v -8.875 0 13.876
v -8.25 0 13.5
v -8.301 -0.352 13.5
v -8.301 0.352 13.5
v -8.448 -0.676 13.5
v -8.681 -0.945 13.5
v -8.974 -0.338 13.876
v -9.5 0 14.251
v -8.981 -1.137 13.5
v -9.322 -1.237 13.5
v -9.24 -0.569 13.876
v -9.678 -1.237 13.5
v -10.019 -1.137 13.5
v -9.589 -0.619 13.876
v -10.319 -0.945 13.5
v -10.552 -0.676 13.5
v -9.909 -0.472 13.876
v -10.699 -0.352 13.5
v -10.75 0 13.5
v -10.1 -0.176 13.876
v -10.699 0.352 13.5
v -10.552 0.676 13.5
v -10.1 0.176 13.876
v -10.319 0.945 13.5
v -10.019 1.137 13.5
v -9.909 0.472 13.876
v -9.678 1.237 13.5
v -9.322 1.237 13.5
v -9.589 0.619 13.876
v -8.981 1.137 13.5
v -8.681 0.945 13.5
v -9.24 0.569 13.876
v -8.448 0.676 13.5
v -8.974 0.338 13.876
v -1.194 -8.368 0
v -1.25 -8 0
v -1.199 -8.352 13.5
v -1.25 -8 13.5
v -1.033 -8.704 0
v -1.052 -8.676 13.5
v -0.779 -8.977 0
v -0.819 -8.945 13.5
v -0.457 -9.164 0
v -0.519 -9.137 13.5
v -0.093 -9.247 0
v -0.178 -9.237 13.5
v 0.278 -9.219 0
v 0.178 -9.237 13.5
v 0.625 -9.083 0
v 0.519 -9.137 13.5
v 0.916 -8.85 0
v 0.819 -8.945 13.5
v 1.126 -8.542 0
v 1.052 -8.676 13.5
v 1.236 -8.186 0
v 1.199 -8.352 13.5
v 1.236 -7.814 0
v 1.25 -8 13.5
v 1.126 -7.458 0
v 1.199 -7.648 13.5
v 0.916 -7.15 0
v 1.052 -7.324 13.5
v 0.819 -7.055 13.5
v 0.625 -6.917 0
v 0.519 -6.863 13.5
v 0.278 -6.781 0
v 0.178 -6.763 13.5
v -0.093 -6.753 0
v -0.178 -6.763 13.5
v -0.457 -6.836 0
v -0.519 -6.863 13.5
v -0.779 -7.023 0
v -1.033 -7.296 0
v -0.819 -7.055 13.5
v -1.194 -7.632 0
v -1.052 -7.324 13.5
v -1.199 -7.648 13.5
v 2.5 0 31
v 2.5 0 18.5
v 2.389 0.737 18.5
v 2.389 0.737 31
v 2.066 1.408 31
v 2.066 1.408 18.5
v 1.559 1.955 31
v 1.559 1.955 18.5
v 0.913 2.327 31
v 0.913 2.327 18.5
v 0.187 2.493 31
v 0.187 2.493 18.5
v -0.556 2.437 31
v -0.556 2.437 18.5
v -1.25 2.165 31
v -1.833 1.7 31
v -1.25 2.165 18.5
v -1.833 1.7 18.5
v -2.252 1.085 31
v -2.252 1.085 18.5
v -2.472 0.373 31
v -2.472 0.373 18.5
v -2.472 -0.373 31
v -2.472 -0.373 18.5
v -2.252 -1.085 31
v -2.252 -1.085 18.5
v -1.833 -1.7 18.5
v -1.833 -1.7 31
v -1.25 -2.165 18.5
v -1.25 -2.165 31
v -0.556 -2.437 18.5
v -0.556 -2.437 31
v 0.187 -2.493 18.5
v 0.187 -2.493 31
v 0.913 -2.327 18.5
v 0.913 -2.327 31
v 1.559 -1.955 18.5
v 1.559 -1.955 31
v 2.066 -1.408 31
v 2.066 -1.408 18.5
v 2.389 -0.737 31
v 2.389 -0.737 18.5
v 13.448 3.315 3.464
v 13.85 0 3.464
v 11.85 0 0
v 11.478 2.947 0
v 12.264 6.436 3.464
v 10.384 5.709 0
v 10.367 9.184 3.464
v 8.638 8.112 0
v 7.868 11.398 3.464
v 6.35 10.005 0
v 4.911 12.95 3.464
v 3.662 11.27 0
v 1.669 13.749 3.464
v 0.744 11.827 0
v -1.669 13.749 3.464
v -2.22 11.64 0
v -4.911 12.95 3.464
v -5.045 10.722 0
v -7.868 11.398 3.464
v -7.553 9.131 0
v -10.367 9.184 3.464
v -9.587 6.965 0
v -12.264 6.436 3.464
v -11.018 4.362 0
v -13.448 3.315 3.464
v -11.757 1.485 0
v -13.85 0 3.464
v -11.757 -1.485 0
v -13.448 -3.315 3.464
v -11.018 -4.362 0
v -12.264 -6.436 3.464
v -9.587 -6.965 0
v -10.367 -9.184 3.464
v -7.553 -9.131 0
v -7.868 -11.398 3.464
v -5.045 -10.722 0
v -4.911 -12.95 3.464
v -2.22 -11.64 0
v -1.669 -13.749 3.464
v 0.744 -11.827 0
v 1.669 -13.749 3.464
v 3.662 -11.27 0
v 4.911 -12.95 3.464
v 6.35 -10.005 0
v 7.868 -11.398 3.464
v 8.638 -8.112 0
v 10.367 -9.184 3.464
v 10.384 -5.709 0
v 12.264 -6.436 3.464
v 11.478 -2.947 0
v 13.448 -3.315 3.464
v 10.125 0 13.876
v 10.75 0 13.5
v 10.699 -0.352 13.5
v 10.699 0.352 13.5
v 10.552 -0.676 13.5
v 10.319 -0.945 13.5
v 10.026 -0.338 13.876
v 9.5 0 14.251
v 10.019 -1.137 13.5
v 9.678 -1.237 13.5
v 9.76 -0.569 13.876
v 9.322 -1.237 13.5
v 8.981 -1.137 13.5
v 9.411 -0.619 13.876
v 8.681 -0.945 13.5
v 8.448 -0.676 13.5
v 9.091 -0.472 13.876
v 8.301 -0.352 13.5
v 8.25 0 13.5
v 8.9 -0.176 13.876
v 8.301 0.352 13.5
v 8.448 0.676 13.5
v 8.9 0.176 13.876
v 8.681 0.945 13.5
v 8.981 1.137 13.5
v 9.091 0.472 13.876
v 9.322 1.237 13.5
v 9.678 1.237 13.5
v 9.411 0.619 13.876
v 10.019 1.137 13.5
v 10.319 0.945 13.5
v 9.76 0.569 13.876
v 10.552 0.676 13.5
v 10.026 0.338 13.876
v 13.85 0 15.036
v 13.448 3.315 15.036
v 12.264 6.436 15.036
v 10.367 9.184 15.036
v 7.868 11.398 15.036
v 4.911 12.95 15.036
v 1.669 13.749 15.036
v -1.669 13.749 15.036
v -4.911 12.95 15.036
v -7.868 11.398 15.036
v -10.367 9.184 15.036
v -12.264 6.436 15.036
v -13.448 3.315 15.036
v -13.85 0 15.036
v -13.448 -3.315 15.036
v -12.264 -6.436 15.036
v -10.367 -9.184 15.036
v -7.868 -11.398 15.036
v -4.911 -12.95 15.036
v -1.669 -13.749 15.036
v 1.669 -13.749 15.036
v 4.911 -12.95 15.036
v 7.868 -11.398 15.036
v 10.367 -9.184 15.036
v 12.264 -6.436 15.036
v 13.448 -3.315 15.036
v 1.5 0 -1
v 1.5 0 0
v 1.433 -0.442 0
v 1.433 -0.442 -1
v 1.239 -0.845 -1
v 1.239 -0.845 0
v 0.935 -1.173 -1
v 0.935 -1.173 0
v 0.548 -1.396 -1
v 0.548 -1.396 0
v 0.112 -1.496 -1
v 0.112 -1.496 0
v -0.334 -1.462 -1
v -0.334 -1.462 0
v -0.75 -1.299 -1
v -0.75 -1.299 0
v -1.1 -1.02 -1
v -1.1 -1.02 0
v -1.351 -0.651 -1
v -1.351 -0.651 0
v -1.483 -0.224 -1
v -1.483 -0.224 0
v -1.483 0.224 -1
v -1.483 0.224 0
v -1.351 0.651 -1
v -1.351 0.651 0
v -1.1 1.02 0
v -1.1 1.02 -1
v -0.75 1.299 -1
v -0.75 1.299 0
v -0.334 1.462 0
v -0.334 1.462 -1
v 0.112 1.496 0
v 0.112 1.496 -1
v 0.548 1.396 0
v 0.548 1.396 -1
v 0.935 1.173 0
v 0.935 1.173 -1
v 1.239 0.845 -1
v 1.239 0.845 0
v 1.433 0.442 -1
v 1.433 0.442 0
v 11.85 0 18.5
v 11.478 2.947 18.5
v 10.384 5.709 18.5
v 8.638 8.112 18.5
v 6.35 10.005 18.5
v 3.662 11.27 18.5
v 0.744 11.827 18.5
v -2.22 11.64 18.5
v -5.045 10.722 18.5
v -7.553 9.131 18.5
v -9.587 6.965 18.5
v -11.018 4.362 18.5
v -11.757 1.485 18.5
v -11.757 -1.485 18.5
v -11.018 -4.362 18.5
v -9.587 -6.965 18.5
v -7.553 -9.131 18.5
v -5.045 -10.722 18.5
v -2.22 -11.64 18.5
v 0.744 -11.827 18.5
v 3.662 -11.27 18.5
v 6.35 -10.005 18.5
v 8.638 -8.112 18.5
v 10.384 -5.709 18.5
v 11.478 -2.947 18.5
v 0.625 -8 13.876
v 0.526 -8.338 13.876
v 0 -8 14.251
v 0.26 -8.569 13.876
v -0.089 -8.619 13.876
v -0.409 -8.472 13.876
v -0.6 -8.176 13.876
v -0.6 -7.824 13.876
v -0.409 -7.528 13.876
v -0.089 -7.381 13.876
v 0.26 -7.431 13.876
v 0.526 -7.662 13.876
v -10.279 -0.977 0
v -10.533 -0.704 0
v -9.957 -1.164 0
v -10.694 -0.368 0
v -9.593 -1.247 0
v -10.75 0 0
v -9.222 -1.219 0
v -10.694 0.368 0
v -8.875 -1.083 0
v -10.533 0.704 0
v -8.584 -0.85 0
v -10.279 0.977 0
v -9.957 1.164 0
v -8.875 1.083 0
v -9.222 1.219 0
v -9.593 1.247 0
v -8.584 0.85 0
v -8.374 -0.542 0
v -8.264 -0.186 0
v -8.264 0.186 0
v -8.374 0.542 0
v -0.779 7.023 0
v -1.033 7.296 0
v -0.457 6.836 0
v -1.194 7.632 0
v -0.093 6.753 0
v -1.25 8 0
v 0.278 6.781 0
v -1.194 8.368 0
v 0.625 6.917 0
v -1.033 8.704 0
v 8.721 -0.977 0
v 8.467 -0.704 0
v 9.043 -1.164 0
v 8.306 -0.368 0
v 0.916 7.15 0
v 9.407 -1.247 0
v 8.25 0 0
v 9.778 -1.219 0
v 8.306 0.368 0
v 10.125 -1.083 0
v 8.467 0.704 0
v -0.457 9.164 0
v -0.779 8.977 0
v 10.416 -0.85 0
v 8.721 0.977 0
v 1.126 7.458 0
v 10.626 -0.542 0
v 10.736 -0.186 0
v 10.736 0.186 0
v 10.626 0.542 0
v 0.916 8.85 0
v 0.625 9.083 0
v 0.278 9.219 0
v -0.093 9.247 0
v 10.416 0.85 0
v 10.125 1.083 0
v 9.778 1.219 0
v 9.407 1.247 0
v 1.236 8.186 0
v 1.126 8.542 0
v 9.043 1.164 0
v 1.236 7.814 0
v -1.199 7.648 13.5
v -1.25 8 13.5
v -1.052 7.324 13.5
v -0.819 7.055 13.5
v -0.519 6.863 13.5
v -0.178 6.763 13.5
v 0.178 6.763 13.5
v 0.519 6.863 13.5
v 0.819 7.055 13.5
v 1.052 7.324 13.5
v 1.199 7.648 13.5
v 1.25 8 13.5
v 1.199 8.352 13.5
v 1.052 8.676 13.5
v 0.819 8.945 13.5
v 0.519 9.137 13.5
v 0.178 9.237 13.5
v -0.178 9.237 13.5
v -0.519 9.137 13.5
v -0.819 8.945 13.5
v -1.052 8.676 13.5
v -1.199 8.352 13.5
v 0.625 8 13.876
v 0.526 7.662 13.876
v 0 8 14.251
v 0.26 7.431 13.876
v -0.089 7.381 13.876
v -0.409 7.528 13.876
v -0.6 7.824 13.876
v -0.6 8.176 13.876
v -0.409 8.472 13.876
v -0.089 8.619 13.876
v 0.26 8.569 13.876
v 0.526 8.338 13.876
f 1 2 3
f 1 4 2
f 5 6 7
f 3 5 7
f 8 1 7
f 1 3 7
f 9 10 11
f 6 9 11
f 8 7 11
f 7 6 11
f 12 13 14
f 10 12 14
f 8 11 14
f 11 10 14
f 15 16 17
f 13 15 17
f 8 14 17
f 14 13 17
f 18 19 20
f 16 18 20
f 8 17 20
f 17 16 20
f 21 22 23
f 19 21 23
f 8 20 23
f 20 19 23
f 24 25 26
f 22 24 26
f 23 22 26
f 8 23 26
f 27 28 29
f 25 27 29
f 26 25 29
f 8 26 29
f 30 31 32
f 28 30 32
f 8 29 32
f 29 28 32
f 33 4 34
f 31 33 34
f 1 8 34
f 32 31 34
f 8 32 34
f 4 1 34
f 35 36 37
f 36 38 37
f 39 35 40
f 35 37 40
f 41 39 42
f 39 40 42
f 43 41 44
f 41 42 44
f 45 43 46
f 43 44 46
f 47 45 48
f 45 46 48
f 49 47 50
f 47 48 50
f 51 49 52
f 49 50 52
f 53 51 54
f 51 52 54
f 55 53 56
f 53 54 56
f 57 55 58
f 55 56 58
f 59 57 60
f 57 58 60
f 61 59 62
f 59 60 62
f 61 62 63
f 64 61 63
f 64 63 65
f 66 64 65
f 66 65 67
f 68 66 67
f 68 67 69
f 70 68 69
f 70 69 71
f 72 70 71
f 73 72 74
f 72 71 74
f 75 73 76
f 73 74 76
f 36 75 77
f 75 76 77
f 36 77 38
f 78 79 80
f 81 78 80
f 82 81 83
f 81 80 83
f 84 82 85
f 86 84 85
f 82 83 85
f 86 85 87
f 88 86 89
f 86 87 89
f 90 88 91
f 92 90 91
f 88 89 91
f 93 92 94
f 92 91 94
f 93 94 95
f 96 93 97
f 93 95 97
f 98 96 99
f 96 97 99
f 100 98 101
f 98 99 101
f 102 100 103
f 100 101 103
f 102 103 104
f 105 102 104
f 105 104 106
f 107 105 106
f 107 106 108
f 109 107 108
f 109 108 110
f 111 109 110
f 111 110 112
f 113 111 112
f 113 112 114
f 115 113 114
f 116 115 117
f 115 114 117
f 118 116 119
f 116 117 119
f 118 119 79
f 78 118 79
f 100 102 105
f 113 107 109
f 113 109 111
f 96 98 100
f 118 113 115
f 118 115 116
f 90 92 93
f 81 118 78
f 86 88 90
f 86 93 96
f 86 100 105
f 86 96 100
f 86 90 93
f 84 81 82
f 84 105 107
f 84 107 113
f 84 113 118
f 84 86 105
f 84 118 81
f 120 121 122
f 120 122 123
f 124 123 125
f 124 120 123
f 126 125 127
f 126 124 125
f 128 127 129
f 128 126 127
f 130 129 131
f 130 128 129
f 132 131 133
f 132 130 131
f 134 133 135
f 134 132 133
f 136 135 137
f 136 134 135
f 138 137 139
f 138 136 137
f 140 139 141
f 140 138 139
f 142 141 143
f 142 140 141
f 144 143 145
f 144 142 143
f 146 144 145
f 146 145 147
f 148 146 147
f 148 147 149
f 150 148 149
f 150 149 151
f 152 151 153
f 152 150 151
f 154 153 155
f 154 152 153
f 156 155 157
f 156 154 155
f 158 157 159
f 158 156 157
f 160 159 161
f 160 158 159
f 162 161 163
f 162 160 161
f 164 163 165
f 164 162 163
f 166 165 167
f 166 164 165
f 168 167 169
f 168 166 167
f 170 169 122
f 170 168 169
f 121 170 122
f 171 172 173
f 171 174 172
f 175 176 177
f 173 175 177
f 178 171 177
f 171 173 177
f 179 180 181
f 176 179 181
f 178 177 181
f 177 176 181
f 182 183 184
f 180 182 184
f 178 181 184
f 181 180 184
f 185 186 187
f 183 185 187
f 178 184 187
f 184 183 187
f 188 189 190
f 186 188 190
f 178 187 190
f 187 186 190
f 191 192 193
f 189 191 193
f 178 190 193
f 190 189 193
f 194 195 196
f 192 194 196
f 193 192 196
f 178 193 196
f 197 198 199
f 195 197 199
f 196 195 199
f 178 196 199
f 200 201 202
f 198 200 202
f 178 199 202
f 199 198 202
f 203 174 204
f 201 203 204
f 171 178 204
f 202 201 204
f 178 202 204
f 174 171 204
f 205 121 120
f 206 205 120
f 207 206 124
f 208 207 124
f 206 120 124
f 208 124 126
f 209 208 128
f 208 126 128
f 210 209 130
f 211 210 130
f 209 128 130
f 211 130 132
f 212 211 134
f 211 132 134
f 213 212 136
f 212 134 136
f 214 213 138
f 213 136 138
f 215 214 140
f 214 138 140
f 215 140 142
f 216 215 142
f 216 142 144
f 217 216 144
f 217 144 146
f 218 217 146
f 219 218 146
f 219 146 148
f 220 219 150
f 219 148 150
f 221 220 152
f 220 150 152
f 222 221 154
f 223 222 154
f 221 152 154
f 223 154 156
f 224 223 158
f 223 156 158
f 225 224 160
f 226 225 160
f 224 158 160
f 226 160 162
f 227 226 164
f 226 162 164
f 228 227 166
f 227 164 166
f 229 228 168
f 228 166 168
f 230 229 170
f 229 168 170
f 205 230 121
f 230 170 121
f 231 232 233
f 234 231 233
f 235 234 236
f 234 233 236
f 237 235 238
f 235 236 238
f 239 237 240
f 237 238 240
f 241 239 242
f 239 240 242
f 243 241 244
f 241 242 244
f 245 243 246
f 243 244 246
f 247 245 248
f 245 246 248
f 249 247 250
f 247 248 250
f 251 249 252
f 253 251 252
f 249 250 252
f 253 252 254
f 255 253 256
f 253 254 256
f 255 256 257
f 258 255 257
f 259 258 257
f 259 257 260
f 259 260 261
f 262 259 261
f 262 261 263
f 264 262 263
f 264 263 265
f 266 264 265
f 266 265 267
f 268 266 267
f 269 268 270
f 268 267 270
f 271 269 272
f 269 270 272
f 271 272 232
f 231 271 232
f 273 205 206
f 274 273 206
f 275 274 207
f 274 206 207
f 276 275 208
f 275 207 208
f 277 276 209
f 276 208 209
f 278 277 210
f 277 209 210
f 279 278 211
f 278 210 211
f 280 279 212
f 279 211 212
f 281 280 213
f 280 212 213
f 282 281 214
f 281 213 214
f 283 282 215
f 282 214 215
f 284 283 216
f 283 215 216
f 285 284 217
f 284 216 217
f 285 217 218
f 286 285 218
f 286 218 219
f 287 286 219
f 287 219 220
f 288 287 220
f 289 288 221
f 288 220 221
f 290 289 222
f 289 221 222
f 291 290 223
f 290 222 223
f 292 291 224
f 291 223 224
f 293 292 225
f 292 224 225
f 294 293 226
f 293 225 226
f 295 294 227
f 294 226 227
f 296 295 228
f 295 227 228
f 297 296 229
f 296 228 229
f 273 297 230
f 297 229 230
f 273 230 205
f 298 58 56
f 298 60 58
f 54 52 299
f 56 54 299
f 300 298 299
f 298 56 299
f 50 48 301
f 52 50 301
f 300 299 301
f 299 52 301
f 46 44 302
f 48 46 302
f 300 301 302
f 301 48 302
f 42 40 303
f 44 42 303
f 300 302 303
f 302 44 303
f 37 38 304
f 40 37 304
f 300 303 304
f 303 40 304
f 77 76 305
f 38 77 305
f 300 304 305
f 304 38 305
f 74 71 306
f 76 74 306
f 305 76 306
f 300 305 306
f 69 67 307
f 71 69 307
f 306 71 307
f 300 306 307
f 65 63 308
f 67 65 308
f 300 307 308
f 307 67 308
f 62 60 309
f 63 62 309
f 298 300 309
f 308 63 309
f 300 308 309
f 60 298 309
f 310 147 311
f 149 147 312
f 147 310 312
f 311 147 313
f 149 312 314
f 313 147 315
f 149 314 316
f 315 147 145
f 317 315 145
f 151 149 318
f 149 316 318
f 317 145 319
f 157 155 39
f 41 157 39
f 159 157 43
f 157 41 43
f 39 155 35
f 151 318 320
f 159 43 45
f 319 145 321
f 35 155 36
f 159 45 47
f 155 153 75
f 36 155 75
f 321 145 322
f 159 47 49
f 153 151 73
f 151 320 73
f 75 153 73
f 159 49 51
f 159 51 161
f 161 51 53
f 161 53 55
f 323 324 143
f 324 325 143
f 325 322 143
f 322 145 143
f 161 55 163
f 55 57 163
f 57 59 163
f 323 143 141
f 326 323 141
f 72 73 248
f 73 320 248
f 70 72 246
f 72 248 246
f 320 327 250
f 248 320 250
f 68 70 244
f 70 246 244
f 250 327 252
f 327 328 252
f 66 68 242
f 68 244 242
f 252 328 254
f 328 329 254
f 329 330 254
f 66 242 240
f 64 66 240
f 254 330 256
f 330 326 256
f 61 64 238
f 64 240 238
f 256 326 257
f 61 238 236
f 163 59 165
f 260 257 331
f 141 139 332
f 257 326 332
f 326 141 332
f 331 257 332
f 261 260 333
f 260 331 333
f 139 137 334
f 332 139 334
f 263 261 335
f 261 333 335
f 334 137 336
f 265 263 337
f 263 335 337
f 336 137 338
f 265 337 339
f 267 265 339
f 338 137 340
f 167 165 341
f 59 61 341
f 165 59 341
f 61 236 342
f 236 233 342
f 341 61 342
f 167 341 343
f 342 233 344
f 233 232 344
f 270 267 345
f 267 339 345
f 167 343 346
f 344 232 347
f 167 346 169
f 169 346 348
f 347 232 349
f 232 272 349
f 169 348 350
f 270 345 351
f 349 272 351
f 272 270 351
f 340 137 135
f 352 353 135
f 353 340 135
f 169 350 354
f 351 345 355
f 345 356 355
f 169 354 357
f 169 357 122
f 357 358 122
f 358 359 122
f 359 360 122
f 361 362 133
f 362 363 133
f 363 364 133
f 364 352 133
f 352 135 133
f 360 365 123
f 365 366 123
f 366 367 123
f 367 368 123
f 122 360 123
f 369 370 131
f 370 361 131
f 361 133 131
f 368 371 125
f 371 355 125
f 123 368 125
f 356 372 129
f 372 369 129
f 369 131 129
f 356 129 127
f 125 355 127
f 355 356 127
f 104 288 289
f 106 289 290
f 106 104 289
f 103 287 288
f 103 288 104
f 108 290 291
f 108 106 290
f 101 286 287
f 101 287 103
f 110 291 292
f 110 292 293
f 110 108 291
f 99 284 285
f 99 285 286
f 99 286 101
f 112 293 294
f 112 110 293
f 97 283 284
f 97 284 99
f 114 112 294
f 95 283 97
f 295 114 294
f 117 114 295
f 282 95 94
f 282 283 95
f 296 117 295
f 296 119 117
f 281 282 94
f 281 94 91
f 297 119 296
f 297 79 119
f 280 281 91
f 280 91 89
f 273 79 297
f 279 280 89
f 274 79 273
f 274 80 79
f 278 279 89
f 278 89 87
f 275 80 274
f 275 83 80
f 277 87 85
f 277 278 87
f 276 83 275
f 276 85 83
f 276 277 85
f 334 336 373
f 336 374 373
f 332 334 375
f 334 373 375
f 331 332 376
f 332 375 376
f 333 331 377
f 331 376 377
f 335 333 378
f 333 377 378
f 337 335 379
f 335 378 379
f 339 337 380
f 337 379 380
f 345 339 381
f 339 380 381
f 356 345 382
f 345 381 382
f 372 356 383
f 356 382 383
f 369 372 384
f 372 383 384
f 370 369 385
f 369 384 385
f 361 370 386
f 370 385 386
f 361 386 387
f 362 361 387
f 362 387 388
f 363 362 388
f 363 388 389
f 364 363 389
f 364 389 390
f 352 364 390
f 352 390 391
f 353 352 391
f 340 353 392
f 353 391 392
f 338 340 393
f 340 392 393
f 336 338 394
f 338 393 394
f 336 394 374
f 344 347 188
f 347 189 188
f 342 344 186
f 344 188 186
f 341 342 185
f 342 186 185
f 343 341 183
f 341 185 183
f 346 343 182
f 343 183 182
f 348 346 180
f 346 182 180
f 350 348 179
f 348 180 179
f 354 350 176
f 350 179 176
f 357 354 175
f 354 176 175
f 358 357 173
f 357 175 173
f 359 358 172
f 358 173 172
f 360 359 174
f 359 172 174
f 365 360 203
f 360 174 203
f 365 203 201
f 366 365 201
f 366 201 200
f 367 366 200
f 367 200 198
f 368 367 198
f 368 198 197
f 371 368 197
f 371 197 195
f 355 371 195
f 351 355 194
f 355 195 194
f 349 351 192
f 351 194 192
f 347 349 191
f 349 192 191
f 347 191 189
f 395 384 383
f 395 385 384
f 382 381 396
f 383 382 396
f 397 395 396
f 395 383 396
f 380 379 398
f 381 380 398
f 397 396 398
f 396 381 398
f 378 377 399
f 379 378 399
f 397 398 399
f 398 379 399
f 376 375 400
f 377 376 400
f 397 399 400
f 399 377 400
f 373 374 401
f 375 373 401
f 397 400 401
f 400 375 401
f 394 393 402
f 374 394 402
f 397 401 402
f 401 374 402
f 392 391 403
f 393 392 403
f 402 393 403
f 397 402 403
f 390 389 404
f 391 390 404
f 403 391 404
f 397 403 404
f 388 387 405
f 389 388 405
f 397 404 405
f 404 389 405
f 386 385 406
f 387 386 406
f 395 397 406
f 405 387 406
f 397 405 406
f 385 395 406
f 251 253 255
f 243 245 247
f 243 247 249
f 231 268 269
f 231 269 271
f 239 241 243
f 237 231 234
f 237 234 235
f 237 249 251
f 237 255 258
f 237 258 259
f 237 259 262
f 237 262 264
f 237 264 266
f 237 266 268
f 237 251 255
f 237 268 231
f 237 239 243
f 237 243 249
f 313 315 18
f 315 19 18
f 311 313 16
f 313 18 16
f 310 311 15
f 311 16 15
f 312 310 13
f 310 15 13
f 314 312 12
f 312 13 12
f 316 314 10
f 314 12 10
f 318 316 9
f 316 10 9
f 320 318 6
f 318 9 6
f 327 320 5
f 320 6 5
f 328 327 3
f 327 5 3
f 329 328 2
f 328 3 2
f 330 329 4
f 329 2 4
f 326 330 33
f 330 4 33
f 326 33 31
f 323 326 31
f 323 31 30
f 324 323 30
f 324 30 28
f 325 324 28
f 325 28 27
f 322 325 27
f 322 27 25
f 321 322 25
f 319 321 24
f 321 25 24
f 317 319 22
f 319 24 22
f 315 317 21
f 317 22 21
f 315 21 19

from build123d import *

# Parameters (mm, degrees)
F0_R       = 13.85
F1_DEPTH   = 18.5
F2_R       = 1.5
F3_DEPTH   = 1
F4_R       = 2.5
F5_DEPTH   = 12.5
F6_SIZE2   = 3.4641016151
F6_SIZE    = 2
F6_2_SIZE2 = 3.4641016151
F6_2_SIZE  = 2
F8_D       = 2.5
F8_DEPTH   = 13.5
F8_TIP     = 0.7510757738


with BuildPart() as f1:
    # F0 (on Top) → F1 (new body)
    with BuildSketch(Plane.XY):
        Circle(F0_R)
    extrude(amount=F1_DEPTH)

    # F2 (on face) → F3 (join)
    with BuildSketch(Plane(origin=(0, 0, 0), x_dir=(1, 0, 0), z_dir=(0, 0, -1))):
        Circle(F2_R)
    extrude(amount=F3_DEPTH)

    # F4 (on face) → F5 (join)
    with BuildSketch(Plane.XY.offset(18.5)):
        Circle(F4_R)
    extrude(amount=F5_DEPTH)

    # F6
    f6_edges = [f1.edges().sort_by_distance(p)[0] for p in [
        (-13.85, 0, 18.5),
    ]]
    f6_side = f1.faces().sort_by_distance((-13.458263, 0, 18.5))[0]
    chamfer(f6_edges, length=F6_SIZE, length2=F6_SIZE2, reference=f6_side)

    # F6#2
    f6_2_edges = [f1.edges().sort_by_distance(p)[0] for p in [
        (-13.85, 0, 0),
    ]]
    f6_2_side = f1.faces().sort_by_distance((-13.458263, 0, 0))[0]
    chamfer(f6_2_edges, length=F6_2_SIZE, length2=F6_2_SIZE2, reference=f6_2_side)

    # F8
    with Locations(Plane(origin=(0, 0, 0), x_dir=(1, 0, 0), z_dir=(0, 0, -1))):
        with Locations((-9.5, 0), (0, 8), (9.5, 0), (0, -8)):
            Hole(F8_D / 2, depth=F8_DEPTH)
            with Locations((0, 0, -(F8_DEPTH + F8_TIP / 2))):  # 118° drill point
                Cone(0, F8_D / 2, F8_TIP, mode=Mode.SUBTRACT)


solid = f1.part
